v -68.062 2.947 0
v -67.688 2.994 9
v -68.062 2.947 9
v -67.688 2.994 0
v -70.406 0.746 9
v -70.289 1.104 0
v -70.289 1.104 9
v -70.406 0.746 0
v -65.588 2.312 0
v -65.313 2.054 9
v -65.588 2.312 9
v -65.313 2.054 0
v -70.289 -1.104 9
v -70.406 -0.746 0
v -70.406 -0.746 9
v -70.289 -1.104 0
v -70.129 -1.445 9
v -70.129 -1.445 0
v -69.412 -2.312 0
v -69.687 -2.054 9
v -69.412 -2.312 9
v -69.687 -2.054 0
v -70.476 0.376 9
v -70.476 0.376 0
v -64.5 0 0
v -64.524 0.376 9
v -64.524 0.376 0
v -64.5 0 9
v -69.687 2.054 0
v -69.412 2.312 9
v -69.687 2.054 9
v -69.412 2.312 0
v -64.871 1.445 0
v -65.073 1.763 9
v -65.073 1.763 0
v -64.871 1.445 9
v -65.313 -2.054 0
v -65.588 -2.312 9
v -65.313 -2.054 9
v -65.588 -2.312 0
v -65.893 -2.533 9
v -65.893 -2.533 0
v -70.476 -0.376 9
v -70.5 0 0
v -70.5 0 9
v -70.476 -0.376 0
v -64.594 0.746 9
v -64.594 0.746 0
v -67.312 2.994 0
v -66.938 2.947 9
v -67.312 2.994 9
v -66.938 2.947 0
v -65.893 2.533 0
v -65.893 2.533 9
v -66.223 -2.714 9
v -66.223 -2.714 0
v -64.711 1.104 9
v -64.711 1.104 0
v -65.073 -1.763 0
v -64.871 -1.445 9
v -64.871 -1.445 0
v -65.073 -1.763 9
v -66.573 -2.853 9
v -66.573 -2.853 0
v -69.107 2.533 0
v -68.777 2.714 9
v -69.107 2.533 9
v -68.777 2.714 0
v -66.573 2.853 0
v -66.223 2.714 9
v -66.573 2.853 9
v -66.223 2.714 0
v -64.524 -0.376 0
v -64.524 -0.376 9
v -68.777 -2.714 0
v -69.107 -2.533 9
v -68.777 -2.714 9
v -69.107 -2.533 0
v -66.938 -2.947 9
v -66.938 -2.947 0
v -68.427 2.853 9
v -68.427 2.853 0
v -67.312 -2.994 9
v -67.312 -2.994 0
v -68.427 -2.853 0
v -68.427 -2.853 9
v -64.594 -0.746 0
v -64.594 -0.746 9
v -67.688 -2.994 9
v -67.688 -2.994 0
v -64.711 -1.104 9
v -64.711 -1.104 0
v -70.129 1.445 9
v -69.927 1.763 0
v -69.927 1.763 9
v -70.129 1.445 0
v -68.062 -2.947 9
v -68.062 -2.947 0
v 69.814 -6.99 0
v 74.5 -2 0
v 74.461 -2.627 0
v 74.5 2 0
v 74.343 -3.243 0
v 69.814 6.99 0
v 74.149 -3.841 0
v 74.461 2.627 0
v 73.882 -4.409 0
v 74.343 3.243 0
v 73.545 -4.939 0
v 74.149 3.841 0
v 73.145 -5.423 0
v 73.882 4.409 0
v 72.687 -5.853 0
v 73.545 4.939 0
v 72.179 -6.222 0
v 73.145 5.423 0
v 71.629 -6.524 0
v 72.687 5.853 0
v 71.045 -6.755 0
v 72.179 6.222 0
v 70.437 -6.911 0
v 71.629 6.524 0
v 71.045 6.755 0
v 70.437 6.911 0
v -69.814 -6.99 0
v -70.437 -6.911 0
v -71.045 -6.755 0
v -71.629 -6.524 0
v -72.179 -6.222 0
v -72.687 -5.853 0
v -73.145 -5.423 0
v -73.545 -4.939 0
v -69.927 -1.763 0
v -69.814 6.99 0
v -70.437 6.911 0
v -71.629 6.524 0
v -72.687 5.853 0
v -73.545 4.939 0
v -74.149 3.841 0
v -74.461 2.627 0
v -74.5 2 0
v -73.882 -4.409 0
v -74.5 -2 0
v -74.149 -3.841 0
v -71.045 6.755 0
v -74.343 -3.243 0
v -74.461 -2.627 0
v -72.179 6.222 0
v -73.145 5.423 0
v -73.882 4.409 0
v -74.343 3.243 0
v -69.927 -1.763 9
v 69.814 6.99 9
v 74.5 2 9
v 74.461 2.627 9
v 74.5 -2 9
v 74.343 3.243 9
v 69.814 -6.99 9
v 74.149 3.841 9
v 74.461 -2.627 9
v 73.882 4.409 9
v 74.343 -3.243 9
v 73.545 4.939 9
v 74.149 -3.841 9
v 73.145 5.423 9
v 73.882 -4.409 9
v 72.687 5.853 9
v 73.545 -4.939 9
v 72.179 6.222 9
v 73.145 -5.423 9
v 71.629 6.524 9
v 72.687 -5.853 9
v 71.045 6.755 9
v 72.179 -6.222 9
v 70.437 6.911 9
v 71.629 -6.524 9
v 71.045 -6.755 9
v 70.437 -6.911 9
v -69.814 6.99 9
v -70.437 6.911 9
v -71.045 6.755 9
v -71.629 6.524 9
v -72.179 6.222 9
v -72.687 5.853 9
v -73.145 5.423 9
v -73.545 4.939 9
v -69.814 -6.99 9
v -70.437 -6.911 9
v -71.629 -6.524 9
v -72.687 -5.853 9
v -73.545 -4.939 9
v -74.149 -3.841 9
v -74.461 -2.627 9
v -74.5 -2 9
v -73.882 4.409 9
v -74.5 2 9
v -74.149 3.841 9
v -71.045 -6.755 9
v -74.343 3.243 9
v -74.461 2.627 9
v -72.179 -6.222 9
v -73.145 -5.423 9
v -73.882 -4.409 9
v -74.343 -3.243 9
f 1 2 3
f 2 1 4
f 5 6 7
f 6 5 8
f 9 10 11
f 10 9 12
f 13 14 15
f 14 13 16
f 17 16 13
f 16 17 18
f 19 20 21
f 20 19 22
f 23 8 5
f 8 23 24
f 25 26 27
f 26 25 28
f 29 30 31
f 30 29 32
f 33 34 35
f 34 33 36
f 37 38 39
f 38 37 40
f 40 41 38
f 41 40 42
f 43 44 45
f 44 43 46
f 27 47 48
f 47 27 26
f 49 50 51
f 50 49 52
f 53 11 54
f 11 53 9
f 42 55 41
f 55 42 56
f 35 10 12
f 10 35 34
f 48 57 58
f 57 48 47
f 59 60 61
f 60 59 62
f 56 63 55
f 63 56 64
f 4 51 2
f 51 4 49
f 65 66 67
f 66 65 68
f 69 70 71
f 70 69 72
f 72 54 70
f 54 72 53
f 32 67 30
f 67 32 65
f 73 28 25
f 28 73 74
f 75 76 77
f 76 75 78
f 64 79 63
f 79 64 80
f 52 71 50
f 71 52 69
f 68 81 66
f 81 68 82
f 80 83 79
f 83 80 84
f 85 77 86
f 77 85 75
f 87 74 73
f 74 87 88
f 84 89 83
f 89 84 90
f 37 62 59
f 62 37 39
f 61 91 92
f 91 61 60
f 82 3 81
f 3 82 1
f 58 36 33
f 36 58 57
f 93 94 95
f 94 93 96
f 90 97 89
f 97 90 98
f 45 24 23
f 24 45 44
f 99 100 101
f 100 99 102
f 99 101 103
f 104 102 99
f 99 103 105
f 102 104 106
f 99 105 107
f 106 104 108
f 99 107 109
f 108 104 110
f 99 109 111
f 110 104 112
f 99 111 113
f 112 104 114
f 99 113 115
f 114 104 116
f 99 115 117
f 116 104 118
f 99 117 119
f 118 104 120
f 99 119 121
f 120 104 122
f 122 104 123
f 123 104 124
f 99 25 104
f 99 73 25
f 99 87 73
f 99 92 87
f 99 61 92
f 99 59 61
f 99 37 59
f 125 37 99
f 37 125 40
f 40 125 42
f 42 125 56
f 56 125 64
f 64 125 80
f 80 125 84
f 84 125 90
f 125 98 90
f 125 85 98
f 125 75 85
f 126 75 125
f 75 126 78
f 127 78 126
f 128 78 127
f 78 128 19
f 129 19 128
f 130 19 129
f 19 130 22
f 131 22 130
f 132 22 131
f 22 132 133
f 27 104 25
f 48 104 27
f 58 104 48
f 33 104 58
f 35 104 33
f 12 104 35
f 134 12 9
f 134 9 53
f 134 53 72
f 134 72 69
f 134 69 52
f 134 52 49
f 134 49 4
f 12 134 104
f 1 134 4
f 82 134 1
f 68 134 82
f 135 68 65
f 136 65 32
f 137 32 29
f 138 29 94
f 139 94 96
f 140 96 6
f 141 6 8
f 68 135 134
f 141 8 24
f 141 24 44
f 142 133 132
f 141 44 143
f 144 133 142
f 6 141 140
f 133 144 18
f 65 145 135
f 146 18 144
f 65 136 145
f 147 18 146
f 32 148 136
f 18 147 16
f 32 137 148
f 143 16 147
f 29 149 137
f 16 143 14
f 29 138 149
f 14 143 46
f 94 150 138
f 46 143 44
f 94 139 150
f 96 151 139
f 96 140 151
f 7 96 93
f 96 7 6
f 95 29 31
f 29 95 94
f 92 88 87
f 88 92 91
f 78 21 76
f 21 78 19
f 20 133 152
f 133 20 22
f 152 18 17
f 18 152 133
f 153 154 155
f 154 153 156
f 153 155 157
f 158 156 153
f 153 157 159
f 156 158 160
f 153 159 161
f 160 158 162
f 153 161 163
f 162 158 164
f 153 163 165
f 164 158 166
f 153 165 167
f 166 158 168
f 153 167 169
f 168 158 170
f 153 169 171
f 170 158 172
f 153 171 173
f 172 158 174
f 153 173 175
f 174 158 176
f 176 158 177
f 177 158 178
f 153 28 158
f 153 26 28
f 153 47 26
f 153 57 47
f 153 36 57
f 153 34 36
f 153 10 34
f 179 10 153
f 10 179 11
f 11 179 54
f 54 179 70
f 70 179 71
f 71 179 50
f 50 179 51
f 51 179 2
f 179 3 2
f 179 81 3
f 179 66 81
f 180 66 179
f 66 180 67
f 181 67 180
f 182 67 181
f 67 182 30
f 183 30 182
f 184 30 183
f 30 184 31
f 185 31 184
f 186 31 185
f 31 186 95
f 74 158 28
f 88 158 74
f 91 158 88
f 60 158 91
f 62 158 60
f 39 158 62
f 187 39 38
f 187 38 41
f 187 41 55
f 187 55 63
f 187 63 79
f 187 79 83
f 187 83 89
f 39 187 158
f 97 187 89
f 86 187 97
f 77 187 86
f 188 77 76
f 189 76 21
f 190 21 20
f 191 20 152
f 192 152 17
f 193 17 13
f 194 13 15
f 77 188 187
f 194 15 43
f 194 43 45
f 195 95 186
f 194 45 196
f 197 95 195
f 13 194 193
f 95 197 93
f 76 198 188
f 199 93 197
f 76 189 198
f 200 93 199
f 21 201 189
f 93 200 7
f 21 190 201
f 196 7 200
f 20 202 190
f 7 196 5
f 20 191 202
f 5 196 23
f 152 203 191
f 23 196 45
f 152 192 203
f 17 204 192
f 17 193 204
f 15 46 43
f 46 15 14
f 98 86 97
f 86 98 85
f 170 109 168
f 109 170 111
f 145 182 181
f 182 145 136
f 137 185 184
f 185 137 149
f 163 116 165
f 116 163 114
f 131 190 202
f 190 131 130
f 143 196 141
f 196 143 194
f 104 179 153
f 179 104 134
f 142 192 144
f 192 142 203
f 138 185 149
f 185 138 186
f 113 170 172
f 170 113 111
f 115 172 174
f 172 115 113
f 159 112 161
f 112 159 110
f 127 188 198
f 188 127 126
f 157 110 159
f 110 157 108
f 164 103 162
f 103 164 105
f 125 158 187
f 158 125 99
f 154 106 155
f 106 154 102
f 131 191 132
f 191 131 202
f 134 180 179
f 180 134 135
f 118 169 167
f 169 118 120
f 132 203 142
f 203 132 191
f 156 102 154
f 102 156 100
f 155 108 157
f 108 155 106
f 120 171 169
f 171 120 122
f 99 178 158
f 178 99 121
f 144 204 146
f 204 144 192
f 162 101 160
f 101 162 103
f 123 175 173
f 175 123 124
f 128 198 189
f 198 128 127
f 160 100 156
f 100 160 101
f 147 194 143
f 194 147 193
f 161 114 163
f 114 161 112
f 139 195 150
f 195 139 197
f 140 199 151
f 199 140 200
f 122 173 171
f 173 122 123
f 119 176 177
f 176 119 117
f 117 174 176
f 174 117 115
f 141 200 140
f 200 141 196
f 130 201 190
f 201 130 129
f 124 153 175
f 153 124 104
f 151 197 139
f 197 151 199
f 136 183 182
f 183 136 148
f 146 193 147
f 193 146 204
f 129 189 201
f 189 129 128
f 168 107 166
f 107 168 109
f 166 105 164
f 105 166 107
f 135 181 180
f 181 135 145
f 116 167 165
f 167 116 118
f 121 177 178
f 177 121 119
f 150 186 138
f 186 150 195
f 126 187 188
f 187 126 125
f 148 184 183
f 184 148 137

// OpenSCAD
$fn = 50;


difference() {
	union() {
		hull() {
			translate(v = [-69.5000000000, 2.0000000000, 0]) {
				cylinder(h = 9, r = 5);
			}
			translate(v = [69.5000000000, 2.0000000000, 0]) {
				cylinder(h = 9, r = 5);
			}
			translate(v = [-69.5000000000, -2.0000000000, 0]) {
				cylinder(h = 9, r = 5);
			}
			translate(v = [69.5000000000, -2.0000000000, 0]) {
				cylinder(h = 9, r = 5);
			}
		}
	}
	union() {
		translate(v = [-67.5000000000, 0.0000000000, 0]) {
			cylinder(h = 9, r = 3.0000000000);
		}
		translate(v = [-67.5000000000, 0.0000000000, 0]) {
			cylinder(h = 9, r = 1.5000000000);
		}
		translate(v = [-67.5000000000, 0.0000000000, 0]) {
			cylinder(h = 9, r = 1.5000000000);
		}
		translate(v = [-67.5000000000, 0.0000000000, 0]) {
			cylinder(h = 9, r = 1.5000000000);
		}
	}
}
